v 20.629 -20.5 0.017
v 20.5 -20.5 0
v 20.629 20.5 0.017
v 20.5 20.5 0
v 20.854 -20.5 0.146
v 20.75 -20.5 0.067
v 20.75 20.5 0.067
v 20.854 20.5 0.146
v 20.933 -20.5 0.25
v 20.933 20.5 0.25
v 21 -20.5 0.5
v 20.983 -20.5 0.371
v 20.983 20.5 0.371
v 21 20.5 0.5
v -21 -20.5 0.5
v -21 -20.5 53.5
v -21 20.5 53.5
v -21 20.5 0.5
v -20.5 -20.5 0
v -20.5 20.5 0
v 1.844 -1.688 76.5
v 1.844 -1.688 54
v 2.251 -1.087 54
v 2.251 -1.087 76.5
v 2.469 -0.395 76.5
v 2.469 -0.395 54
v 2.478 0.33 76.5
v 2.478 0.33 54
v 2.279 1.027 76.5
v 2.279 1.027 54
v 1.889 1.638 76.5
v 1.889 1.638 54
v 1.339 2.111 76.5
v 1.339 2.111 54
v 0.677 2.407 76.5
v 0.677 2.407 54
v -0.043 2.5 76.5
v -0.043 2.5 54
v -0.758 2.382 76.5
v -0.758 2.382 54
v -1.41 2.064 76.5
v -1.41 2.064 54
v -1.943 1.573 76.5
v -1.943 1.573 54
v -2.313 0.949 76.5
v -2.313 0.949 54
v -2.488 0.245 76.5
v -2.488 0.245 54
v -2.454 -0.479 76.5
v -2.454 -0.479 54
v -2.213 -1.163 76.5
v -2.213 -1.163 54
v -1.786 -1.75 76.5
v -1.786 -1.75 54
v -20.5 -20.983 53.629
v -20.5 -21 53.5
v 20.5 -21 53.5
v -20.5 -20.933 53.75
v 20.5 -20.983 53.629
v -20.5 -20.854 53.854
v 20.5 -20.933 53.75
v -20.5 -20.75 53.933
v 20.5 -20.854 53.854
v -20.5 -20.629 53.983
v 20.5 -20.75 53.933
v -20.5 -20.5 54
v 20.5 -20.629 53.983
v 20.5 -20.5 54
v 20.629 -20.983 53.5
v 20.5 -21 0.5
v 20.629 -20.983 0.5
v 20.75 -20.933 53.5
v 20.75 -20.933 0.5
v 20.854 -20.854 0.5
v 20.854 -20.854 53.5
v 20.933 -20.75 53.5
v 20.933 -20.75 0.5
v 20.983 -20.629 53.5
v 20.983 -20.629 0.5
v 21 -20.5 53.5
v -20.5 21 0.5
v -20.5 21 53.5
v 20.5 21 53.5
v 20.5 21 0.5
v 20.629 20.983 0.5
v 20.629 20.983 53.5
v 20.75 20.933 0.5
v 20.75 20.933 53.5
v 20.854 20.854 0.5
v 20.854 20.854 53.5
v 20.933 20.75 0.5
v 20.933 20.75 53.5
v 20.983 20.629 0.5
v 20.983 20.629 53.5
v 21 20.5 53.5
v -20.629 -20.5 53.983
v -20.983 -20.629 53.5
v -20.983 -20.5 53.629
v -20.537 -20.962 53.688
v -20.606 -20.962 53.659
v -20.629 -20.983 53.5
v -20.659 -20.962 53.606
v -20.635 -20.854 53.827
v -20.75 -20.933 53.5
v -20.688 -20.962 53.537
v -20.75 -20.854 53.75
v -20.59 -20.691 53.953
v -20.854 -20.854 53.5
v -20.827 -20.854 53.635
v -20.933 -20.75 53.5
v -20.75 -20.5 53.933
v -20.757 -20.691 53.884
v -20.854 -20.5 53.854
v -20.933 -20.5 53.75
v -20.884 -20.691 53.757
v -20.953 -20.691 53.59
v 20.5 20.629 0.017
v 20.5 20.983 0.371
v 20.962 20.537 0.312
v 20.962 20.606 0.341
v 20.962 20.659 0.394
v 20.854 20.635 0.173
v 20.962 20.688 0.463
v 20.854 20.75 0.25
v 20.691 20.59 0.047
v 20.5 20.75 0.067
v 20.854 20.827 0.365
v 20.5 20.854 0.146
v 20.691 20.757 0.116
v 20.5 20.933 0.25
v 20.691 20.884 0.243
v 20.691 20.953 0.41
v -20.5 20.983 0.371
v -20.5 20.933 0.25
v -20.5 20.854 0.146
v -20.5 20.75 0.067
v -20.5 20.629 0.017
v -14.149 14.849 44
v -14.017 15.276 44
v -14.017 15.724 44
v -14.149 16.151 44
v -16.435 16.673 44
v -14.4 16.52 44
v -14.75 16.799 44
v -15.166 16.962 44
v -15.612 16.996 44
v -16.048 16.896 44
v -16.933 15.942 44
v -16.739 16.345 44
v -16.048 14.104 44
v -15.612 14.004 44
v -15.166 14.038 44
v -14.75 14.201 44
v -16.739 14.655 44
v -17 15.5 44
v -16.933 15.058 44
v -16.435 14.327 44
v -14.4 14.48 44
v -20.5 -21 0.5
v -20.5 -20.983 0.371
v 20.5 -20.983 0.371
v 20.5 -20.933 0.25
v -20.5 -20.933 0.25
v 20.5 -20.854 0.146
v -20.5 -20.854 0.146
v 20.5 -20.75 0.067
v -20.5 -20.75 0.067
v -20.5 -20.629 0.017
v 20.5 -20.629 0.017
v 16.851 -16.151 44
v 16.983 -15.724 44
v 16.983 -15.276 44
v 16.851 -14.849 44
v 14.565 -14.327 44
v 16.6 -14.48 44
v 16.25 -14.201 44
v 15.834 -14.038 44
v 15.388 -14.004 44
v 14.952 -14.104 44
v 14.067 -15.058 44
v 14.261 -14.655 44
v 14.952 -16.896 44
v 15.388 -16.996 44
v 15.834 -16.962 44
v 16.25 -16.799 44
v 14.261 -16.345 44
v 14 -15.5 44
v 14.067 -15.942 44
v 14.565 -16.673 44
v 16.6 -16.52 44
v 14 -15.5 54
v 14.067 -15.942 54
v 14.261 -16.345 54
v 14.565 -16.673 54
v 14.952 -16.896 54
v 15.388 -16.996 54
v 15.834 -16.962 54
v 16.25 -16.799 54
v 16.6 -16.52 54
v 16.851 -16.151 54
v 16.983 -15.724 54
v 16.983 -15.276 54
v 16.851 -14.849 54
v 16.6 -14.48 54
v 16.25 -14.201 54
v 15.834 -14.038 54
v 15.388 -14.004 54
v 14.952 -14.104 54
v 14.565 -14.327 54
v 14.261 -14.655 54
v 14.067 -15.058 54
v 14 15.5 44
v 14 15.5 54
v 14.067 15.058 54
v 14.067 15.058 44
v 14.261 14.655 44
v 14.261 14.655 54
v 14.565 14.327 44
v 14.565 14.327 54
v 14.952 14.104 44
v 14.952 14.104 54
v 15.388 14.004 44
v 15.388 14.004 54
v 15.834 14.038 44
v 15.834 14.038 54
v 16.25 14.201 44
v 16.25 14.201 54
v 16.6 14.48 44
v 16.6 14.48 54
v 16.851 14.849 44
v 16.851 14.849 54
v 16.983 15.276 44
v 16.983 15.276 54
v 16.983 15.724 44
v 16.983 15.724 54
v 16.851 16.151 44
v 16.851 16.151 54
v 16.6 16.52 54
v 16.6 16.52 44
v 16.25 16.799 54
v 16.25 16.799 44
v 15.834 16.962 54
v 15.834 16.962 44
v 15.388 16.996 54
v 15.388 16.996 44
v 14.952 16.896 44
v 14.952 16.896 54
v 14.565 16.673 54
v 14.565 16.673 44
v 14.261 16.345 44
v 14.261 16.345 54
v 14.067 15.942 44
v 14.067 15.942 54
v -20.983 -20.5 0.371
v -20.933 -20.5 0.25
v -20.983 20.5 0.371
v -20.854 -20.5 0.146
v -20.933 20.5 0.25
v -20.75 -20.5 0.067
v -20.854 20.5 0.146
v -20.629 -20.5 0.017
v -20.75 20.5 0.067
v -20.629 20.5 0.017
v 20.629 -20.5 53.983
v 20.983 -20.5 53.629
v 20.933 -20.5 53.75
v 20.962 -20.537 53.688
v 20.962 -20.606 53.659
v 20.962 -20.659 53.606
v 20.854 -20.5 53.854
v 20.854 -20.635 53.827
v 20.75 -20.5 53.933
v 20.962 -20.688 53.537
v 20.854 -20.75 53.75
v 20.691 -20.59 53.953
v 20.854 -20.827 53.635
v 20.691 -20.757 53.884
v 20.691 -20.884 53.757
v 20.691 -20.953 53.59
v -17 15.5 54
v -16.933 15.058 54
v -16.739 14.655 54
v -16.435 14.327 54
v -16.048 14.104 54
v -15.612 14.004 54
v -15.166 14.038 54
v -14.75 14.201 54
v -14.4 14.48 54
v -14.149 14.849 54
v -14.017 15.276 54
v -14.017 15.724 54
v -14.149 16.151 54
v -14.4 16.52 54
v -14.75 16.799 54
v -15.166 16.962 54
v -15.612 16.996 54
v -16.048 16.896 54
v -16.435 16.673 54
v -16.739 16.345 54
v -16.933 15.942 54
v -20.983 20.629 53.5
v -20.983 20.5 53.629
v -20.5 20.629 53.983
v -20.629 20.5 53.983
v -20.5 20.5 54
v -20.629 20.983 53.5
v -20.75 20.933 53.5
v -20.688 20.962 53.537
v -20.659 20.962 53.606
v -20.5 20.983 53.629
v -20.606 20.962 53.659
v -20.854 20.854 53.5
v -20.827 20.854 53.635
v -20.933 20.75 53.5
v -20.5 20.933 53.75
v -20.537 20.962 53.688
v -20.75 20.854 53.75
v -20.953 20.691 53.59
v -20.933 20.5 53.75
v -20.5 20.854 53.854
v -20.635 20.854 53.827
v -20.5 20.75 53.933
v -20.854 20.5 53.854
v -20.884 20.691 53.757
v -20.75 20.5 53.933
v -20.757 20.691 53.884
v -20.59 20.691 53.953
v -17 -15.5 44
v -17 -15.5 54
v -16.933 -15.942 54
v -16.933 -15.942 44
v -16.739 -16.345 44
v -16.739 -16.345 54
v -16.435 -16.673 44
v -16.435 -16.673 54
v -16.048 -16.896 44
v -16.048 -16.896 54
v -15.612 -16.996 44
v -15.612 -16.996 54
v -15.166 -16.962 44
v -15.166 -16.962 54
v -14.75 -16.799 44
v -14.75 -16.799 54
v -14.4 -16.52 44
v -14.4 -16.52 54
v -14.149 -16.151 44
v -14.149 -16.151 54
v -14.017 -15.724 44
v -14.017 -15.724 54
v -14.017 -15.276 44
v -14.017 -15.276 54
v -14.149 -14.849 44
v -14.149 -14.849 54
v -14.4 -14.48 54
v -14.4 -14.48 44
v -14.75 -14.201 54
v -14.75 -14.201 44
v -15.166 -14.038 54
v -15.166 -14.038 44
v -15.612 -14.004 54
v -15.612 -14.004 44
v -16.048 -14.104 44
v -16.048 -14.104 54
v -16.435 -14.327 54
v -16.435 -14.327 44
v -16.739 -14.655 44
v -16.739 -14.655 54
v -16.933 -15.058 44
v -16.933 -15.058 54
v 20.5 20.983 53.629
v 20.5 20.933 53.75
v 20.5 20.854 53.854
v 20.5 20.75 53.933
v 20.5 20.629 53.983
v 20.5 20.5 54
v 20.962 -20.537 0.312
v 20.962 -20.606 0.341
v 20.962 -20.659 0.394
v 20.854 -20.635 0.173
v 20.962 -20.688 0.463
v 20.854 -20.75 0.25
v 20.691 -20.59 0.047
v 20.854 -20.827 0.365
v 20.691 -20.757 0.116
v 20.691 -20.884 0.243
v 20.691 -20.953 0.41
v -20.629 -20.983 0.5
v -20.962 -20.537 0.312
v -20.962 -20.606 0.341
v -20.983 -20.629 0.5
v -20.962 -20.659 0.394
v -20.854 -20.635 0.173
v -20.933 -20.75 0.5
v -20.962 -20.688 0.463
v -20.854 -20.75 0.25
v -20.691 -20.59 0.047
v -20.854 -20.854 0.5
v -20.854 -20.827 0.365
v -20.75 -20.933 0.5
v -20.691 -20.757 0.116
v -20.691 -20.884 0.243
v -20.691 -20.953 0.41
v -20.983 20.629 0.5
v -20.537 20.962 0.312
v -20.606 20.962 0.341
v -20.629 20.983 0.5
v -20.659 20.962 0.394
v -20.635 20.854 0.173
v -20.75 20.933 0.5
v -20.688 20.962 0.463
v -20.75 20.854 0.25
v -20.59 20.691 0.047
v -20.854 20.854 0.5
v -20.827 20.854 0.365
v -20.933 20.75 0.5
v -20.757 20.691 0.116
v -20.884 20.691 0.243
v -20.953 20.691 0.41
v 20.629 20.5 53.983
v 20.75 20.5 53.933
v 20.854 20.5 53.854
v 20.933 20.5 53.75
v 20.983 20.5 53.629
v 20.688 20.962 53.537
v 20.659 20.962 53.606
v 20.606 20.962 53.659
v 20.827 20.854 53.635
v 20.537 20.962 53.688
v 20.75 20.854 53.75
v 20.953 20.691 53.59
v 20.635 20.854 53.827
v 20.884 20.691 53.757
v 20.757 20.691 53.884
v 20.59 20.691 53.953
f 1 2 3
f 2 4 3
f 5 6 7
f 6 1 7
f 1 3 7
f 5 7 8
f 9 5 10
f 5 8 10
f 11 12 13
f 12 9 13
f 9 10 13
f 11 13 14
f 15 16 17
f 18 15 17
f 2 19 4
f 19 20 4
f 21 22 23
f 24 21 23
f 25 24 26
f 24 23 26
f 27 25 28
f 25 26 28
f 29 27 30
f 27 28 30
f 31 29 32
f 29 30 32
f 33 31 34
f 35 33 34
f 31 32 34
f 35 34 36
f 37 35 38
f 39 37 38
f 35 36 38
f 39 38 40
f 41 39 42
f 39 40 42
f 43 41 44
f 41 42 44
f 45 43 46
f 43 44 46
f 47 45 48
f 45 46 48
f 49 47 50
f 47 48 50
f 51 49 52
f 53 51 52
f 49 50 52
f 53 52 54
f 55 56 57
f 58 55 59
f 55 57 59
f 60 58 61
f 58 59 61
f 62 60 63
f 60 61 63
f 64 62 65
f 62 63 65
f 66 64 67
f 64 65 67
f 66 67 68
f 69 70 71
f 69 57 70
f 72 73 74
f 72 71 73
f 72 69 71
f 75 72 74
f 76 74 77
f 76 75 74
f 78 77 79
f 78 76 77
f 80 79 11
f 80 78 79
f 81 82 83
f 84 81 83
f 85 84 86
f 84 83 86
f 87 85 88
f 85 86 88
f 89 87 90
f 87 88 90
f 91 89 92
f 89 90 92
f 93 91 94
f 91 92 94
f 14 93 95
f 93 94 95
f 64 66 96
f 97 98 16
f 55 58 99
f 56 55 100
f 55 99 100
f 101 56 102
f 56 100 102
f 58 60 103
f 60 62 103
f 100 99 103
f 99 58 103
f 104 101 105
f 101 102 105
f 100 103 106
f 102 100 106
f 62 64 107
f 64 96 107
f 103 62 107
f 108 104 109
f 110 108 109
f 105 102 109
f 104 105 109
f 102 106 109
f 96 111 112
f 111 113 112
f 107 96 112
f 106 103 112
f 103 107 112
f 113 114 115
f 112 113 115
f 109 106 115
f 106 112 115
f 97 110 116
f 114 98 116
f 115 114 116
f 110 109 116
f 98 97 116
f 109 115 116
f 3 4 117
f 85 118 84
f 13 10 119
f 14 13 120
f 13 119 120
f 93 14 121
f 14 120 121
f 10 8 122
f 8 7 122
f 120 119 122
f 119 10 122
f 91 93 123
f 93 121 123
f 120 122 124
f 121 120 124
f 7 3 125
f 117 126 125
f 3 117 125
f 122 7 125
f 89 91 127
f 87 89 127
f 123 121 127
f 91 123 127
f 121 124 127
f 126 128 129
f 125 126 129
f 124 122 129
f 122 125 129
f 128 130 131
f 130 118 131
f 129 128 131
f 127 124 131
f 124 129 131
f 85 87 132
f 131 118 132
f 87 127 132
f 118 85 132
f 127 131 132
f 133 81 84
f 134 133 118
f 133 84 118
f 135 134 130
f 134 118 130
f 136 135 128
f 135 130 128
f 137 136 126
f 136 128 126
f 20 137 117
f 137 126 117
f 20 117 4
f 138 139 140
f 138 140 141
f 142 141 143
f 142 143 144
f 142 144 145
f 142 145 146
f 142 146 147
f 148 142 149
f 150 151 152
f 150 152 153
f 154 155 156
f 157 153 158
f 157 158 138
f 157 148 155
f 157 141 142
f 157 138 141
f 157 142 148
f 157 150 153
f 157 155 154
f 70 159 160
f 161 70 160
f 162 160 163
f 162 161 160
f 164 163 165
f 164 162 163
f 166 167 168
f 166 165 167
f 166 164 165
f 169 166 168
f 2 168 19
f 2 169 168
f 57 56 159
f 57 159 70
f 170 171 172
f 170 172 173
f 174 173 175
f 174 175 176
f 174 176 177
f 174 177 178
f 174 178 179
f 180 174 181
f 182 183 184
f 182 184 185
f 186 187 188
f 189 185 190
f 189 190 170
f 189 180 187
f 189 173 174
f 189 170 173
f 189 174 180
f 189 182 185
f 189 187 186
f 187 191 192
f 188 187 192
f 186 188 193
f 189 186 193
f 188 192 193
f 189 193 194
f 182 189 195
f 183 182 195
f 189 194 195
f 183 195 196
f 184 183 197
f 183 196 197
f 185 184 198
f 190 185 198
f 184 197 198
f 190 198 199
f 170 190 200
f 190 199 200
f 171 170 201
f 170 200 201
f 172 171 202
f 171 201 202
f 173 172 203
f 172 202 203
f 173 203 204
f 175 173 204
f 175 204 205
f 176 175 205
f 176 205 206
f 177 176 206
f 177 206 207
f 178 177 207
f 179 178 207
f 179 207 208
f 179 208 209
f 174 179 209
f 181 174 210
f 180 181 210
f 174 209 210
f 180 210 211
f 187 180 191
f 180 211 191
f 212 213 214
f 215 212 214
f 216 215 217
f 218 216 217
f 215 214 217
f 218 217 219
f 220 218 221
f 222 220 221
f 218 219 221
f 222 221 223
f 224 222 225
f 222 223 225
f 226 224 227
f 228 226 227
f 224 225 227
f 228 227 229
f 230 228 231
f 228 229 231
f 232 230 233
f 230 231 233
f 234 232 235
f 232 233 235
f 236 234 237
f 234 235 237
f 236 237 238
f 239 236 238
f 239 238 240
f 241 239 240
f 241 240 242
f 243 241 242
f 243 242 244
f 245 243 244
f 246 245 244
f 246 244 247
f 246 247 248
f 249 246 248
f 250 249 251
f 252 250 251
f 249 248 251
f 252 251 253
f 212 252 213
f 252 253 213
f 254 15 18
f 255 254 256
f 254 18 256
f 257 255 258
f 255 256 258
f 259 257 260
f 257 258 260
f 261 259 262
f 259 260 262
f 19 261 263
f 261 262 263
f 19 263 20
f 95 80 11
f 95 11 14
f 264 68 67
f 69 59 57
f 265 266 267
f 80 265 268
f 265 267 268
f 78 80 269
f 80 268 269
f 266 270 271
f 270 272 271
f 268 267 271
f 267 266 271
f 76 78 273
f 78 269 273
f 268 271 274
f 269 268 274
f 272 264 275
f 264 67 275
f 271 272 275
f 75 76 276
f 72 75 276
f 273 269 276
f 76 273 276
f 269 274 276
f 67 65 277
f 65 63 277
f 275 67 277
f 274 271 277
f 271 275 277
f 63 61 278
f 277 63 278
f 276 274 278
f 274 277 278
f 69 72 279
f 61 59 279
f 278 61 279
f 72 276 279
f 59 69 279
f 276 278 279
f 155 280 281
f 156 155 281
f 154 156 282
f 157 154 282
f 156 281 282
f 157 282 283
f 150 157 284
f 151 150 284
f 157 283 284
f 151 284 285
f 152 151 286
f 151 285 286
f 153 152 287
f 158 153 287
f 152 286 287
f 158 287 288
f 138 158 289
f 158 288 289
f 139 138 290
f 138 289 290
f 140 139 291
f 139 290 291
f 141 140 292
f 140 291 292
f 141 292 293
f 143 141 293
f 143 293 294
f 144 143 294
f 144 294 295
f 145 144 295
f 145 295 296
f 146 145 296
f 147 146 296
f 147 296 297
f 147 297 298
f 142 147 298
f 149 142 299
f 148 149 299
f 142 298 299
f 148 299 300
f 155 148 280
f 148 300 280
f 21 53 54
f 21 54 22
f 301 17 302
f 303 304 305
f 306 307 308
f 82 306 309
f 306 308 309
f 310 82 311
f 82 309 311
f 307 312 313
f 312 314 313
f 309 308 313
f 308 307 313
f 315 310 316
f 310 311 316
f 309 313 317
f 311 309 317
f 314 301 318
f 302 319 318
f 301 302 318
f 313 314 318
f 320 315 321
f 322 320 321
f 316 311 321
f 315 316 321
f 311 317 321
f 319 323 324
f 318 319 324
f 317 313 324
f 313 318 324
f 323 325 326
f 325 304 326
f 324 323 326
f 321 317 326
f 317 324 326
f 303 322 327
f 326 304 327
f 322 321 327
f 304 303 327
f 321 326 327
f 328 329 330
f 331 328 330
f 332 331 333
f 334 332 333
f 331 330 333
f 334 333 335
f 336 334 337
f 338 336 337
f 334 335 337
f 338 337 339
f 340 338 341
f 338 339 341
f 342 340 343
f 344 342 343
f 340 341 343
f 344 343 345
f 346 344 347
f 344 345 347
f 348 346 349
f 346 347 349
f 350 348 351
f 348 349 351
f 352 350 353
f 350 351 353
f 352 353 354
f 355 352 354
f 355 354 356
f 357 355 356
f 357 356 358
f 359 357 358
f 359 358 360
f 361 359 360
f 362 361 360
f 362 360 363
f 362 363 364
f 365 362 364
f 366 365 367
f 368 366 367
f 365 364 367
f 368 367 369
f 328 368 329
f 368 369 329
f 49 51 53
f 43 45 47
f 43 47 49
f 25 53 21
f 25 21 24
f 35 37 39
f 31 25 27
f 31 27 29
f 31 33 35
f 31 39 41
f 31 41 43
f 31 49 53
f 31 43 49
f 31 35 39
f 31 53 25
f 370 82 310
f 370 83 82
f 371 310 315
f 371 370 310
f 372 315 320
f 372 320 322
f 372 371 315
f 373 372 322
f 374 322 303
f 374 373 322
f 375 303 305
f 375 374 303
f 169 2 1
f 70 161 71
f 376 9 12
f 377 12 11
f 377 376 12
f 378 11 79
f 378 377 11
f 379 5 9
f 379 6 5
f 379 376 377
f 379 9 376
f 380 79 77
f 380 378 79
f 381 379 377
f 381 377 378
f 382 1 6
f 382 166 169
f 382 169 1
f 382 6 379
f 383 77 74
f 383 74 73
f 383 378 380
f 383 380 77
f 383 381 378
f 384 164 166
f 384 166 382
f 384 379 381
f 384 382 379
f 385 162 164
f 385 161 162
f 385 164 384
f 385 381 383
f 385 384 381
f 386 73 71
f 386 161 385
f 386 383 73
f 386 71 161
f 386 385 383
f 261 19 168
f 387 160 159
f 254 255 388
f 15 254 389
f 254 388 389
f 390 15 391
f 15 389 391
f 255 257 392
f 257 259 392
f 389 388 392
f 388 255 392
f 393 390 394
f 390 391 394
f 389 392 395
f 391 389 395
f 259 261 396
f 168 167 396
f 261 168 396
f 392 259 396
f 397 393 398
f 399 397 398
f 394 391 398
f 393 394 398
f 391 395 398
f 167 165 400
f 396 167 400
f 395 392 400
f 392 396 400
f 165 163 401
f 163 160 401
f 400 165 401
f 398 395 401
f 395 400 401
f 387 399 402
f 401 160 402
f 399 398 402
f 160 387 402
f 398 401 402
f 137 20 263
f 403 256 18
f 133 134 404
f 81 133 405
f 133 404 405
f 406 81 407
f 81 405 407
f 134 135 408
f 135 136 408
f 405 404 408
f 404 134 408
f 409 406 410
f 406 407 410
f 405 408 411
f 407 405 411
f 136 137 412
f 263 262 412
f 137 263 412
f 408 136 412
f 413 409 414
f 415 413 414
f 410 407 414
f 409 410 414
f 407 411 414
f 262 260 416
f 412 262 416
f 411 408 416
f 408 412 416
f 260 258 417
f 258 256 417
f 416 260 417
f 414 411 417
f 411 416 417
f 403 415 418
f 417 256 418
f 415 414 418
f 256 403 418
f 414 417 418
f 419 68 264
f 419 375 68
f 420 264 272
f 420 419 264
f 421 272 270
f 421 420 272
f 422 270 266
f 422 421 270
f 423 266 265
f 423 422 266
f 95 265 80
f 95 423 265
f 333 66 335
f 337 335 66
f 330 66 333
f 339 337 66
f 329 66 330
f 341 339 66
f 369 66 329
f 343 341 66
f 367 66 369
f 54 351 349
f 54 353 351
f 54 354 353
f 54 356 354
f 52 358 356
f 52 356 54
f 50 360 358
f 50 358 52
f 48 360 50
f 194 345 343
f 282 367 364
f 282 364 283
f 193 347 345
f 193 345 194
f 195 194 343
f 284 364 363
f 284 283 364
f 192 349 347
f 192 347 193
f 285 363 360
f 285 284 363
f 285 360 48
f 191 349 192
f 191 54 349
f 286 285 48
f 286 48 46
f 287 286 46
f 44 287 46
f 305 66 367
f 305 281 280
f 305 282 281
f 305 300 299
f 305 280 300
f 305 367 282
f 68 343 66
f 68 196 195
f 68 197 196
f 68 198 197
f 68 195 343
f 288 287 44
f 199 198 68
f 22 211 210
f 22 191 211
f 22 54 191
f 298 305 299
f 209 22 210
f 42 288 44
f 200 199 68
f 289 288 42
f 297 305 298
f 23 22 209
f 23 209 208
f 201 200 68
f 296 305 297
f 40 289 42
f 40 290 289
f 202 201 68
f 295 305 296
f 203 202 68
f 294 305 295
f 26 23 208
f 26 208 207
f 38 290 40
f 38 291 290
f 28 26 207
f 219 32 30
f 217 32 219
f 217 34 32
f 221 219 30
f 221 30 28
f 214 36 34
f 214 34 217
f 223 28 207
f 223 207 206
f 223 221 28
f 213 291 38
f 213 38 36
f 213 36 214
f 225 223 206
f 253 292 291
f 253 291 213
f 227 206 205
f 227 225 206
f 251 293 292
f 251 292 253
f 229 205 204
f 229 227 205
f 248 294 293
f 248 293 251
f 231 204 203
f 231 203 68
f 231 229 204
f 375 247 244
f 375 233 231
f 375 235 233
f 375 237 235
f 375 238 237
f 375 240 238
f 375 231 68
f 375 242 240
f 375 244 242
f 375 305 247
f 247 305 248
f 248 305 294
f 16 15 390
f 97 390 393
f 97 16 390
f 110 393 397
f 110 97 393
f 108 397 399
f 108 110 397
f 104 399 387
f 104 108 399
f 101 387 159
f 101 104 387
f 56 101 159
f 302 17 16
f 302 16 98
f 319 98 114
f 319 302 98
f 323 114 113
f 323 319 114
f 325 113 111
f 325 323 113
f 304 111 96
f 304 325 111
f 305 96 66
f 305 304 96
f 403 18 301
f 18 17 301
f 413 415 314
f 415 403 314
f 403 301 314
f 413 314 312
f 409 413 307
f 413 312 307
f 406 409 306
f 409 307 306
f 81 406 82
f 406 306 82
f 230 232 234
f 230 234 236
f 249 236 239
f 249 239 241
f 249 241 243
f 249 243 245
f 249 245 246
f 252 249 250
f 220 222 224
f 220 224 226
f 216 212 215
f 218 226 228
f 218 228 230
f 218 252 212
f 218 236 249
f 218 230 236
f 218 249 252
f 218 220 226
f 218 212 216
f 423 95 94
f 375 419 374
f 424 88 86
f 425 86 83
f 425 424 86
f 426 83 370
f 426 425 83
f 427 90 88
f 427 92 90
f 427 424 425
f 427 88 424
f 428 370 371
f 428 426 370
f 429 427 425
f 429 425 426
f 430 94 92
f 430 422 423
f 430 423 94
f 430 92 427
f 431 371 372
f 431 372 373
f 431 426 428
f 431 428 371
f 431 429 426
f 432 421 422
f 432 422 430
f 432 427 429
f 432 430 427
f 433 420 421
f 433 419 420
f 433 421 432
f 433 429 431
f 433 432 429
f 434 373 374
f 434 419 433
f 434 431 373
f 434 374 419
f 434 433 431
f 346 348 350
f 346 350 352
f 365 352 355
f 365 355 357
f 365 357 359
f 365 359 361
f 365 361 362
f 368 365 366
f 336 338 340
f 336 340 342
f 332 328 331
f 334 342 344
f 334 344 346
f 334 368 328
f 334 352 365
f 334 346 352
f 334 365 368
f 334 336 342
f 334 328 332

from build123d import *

# Parameters (mm, degrees)
SKETCH_1_W          = 42
SKETCH_1_H          = 42
EXTRUDE_1_DEPTH     = 54
EXTRUDE_START       = 54
EXTRUDE_2_DEPTH     = 22.5
FILLET_1_R          = 0.5
CUT_EXTRUDE_START   = 54
SKETCH_3_R          = 1.5
CUT_EXTRUDE_1_DEPTH = 10


with BuildPart() as part:
    # 草图1 → 凸台-拉伸1 (new body)
    with BuildSketch(Plane.XY):
        Rectangle(SKETCH_1_W, SKETCH_1_H)
    extrude(amount=EXTRUDE_1_DEPTH)

    # 草图2 → 凸台-拉伸2 (add)
    with BuildSketch(Plane.XY.offset(EXTRUDE_START)):
        with BuildLine():
            Line((-1.785837809, -1.749509451), (1.844440663, -1.687613298))
            ThreePointArc((1.844440663, -1.687613298), (-0.042618741, 2.499636702), (-1.785837809, -1.749509451))
        make_face()
    extrude(amount=EXTRUDE_2_DEPTH)

    # 圆角1
    fillet_1_edges = [part.edges().sort_by_distance(p)[0] for p in [
        (-21, 0, 54),
        (0, -21, 54),
        (21, 0, 54),
        (0, -21, 0),
        (-21, 0, 0),
        (0, 21, 0),
        (21, 0, 0),
        (21, -21, 27),
        (-21, -21, 27),
        (-21, 21, 27),
        (21, 21, 27),
        (0, 21, 54),
    ]]
    fillet(fillet_1_edges, radius=FILLET_1_R)

    # 草图3 → 切除-拉伸1 (cut)
    with BuildSketch(Plane.XY.offset(CUT_EXTRUDE_START)):
        with Locations(Location((-15.5, 15.5, 0), (0, 0, 180))):
            Circle(SKETCH_3_R)
        with Locations(Location((15.5, 15.5, 0), (0, 0, 180))):
            Circle(SKETCH_3_R)
        with Locations(Location((15.5, -15.5, 0), (0, 0, 180))):
            Circle(SKETCH_3_R)
        with Locations(Location((-15.5, -15.5, 0), (0, 0, 180))):
            Circle(SKETCH_3_R)
    extrude(amount=-CUT_EXTRUDE_1_DEPTH, mode=Mode.SUBTRACT)


solid = part.part
